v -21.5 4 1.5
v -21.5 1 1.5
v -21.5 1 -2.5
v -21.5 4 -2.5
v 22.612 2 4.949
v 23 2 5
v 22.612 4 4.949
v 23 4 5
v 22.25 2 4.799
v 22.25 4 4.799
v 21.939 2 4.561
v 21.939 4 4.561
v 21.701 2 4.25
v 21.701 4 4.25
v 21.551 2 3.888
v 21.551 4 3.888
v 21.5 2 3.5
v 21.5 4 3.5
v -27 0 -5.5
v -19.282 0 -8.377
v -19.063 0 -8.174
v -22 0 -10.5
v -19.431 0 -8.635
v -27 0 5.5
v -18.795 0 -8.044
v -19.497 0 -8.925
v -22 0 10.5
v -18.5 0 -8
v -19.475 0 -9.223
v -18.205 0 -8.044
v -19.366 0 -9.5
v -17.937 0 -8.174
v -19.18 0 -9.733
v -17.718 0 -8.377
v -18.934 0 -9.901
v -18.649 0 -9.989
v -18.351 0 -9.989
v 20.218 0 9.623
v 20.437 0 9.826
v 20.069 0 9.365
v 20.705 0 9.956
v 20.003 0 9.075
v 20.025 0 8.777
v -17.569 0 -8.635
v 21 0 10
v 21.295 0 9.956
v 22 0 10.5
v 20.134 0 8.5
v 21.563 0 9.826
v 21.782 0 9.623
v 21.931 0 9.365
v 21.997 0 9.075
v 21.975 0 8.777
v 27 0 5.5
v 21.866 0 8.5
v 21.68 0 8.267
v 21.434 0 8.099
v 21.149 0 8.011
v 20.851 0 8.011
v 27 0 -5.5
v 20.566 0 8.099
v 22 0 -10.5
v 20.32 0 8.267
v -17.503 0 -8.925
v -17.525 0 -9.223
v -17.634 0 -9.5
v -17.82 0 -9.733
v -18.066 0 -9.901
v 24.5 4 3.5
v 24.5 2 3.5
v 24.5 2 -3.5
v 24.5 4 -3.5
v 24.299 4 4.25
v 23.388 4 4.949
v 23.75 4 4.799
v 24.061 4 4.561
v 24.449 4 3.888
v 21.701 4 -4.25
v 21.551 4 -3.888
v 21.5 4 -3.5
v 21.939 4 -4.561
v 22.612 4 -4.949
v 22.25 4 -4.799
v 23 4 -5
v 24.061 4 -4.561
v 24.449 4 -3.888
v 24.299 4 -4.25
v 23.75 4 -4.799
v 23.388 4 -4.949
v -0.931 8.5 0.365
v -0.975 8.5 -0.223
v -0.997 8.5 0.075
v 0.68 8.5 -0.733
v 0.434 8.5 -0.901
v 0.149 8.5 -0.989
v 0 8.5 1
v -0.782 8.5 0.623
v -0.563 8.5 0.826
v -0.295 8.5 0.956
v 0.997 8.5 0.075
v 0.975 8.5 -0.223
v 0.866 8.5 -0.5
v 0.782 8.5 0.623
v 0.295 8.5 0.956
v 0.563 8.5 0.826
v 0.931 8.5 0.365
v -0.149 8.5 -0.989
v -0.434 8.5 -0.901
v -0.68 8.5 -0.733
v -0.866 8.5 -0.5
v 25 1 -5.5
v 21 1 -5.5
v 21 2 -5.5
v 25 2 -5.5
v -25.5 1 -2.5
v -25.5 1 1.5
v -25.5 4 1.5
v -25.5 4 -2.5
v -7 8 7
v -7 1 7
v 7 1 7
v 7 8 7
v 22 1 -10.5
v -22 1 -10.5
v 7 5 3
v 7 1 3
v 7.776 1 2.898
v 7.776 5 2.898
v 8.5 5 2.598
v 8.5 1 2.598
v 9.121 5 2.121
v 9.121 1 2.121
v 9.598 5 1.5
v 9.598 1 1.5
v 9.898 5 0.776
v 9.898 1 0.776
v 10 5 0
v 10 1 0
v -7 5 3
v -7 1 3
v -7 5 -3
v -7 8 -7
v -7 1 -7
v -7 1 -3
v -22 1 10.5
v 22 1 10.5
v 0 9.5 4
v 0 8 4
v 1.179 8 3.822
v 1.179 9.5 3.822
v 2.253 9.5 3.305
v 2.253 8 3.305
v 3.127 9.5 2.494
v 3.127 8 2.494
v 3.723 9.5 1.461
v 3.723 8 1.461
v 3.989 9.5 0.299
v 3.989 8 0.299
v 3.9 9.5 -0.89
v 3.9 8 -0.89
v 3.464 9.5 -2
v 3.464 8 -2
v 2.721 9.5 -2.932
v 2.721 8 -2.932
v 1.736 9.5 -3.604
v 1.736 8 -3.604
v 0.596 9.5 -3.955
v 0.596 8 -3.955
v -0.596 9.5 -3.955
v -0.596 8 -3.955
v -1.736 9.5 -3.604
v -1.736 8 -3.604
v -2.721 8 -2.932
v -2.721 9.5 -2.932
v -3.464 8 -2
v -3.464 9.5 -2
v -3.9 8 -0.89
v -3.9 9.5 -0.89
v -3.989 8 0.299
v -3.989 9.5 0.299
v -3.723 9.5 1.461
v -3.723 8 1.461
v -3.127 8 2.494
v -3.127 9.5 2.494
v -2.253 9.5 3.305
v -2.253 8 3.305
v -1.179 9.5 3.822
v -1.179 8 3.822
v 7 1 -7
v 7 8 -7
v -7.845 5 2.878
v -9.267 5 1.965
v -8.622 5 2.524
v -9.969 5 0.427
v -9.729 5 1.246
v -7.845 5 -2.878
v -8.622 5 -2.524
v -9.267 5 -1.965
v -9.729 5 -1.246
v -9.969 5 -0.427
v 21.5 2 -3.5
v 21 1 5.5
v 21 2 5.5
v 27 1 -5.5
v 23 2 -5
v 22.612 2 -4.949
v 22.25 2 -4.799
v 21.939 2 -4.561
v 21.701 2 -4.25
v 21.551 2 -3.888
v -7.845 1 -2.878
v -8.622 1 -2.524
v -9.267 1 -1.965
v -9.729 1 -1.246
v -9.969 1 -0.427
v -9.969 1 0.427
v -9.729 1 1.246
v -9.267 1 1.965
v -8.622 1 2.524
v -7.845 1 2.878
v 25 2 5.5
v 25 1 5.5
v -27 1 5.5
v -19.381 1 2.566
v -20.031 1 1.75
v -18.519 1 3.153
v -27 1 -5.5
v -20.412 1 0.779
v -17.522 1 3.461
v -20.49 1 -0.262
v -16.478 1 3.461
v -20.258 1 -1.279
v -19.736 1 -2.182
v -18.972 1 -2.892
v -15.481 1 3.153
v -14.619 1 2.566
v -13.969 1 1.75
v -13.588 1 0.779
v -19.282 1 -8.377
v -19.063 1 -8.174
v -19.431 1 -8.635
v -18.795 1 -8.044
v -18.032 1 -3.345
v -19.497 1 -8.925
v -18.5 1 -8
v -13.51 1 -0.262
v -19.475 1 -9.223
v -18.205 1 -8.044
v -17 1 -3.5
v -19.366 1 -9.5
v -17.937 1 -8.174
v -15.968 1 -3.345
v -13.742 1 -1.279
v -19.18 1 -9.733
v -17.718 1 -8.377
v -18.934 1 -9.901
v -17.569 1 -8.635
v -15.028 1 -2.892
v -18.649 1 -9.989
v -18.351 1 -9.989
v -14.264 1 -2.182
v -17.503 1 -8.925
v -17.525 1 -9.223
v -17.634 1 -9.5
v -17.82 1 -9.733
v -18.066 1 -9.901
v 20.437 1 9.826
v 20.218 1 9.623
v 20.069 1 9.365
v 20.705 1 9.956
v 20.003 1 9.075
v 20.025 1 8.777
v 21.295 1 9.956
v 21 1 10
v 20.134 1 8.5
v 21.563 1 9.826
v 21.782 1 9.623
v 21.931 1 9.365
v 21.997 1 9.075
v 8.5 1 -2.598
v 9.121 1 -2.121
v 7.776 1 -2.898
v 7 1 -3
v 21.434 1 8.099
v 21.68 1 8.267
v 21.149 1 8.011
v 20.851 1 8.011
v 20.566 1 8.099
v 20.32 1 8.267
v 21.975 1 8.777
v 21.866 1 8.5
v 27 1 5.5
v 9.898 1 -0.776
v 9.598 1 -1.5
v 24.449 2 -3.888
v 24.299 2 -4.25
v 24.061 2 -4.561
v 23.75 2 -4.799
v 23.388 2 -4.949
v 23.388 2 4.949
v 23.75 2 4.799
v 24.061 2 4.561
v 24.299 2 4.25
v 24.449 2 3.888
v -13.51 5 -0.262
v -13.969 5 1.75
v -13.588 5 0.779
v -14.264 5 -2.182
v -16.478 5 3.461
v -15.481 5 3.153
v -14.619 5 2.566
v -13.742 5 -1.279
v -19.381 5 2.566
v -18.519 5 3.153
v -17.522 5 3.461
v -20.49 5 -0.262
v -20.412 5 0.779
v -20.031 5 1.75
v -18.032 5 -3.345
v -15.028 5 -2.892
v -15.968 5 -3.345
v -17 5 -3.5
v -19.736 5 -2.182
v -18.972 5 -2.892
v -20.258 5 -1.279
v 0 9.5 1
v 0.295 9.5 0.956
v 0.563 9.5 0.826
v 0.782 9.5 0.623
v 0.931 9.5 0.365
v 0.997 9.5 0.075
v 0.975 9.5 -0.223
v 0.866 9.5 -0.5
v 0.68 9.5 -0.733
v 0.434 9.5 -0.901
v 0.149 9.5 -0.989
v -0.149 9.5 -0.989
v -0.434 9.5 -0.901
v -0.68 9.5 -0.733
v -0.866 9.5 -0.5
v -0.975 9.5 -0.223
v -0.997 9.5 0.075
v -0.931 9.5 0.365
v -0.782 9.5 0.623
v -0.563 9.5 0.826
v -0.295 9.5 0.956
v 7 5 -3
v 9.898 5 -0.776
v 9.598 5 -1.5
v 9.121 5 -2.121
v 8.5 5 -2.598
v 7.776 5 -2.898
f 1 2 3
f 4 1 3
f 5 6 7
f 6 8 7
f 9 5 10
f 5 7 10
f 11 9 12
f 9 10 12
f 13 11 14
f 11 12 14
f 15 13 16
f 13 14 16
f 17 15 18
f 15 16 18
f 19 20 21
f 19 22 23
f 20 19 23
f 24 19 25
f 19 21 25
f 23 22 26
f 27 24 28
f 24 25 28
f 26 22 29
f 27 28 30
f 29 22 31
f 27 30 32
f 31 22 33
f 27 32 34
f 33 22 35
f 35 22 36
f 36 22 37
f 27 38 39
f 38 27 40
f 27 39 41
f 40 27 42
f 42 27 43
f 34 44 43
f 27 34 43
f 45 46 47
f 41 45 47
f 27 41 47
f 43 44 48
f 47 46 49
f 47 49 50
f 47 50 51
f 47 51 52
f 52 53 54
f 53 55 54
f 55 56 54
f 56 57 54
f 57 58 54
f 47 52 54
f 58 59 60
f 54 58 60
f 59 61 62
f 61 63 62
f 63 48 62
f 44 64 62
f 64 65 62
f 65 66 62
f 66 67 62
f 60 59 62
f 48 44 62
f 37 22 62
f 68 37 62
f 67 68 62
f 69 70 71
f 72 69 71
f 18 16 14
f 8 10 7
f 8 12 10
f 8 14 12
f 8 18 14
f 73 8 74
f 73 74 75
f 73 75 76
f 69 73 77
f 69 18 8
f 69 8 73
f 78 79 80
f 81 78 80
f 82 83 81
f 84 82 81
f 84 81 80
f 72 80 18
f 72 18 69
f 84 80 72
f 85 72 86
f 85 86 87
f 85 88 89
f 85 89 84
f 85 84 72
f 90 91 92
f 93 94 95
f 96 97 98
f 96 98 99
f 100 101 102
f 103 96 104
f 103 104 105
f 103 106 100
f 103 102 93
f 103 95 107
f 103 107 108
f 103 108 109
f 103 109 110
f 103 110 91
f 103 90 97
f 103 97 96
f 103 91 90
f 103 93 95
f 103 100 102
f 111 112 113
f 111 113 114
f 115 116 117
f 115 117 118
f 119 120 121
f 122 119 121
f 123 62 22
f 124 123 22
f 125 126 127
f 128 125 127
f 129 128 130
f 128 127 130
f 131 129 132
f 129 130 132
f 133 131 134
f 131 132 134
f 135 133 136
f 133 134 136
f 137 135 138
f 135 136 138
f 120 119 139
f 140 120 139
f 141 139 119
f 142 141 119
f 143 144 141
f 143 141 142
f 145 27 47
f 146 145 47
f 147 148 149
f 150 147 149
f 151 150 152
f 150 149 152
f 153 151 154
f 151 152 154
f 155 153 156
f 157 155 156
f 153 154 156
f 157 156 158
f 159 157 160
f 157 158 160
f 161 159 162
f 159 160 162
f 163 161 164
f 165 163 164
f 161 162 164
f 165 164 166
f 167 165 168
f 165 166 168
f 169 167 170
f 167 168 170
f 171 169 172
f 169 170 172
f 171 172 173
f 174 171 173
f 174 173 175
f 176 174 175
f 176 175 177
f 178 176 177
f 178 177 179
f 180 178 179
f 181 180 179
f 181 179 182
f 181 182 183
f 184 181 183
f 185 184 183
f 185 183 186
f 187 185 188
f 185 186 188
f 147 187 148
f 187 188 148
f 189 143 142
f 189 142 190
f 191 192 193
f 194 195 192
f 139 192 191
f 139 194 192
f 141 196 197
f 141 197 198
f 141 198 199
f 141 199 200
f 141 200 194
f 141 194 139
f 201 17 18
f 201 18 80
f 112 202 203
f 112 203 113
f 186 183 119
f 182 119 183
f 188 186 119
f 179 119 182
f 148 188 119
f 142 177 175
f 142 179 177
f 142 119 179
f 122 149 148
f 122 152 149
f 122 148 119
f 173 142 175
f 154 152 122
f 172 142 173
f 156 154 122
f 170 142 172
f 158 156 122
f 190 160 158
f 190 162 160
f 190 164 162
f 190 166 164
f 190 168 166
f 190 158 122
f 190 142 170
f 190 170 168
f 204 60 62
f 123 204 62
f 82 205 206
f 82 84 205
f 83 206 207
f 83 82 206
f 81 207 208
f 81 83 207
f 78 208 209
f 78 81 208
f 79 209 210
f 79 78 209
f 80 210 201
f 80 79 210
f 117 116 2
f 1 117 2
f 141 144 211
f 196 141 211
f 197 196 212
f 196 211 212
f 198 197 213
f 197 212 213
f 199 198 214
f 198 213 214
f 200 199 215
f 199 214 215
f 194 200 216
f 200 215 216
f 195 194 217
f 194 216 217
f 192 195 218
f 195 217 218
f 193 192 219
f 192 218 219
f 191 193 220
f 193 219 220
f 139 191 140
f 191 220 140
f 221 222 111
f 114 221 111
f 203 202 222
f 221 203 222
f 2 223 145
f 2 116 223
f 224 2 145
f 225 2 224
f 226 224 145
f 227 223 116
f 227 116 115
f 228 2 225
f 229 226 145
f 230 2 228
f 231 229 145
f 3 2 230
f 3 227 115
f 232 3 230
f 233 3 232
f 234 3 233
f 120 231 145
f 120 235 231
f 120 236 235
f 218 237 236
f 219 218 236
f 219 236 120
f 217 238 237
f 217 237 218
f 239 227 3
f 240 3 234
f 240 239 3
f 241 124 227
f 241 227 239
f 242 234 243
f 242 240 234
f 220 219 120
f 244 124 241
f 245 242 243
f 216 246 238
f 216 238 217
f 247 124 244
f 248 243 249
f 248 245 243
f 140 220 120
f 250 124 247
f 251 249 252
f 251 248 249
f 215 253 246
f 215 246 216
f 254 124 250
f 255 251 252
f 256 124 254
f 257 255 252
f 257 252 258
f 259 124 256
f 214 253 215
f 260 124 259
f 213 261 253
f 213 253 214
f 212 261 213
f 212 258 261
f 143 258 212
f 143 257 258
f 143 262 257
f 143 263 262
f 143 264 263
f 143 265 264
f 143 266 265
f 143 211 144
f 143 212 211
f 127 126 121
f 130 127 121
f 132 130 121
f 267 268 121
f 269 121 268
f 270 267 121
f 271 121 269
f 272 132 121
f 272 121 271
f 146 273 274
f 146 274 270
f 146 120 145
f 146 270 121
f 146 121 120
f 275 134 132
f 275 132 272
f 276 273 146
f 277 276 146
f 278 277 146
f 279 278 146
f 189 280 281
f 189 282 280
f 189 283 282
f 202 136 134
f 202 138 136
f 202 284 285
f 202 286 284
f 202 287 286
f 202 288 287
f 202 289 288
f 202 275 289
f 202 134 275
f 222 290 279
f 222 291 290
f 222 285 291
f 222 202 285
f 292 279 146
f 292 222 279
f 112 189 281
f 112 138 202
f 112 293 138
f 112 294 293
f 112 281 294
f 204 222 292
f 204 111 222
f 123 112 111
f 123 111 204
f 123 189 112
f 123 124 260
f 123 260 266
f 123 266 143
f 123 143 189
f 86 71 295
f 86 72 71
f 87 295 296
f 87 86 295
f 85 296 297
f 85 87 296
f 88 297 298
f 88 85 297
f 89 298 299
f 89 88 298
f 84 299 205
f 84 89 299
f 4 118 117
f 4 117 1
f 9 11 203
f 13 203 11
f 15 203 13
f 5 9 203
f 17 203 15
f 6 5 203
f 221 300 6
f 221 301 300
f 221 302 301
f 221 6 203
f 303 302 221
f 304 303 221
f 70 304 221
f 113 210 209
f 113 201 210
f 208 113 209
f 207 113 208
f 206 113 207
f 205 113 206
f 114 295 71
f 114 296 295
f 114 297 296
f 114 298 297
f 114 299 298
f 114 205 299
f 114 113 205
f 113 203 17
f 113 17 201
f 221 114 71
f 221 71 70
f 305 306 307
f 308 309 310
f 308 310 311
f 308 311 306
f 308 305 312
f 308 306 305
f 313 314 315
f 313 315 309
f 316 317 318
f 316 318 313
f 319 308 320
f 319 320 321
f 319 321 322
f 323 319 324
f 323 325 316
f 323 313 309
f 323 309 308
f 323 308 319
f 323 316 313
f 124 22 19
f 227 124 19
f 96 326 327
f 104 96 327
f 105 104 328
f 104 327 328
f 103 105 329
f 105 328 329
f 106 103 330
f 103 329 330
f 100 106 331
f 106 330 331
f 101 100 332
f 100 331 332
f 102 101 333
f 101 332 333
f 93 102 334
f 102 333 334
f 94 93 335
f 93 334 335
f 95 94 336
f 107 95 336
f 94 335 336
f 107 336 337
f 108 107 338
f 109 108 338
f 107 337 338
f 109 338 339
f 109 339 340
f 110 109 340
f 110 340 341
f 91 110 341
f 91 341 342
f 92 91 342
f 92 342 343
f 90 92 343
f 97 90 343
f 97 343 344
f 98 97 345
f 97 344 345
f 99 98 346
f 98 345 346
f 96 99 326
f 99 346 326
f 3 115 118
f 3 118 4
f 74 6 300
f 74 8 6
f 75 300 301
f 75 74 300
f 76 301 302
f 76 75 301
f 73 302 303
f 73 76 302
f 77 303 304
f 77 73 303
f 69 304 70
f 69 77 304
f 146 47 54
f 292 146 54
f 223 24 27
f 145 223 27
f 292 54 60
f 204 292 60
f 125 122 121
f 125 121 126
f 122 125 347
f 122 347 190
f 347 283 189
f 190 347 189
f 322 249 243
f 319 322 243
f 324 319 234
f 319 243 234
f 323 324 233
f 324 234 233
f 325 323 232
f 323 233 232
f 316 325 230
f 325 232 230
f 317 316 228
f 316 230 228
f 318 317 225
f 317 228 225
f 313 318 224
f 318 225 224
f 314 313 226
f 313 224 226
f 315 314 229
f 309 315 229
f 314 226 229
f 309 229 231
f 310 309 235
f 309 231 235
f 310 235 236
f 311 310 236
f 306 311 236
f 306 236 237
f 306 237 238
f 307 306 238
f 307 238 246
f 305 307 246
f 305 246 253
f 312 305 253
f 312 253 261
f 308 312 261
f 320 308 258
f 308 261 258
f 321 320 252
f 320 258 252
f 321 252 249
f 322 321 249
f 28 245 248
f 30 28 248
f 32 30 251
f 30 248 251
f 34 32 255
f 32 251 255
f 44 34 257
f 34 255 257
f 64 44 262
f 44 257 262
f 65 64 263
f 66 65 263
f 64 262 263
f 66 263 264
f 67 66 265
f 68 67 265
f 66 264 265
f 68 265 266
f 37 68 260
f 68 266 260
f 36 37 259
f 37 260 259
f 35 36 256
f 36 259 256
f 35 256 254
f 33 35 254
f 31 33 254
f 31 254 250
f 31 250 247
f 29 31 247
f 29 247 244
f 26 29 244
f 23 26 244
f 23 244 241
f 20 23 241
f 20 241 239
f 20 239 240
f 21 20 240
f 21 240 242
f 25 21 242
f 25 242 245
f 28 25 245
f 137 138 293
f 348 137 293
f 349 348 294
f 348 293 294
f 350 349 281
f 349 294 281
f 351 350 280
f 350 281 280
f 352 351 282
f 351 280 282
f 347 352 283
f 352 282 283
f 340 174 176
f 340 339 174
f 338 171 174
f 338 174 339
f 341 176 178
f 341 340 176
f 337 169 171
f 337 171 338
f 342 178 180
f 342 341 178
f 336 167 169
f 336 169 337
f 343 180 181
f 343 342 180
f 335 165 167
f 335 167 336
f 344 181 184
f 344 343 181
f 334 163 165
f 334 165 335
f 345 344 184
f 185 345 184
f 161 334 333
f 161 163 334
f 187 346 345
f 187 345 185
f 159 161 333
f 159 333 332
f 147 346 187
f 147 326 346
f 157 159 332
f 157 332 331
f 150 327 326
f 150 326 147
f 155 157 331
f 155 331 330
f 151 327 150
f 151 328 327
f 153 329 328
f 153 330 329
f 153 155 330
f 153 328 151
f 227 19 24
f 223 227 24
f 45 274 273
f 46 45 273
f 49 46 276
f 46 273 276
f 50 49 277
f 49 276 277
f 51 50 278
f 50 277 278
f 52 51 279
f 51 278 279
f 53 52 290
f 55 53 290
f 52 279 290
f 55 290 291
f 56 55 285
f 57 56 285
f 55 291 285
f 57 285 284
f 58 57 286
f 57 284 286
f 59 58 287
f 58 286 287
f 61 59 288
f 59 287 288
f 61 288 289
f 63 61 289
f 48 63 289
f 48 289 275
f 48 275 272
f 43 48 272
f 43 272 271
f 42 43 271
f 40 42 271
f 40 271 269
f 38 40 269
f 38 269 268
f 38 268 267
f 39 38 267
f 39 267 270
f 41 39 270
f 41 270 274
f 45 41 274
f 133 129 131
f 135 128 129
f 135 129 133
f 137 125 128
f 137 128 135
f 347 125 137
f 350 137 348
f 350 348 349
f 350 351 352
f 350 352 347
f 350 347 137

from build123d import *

# Parameters (mm, degrees)
BOSS_EXTRUDE1_DEPTH = 1
SKETCH2_W           = 14
SKETCH2_H           = 14
BOSS_EXTRUDE2_DEPTH = 7
SKETCH3_R           = 4
BOSS_EXTRUDE3_DEPTH = 1.5
BOSS_EXTRUDE4_DEPTH = 4
SKETCH6_R           = 1
CUT_EXTRUDE1_DEPTH  = 1
CUT_EXTRUDE2_REACH  = 32.191
SKETCH7_R           = 1
SKETCH8_R           = 3.5
BOSS_EXTRUDE5_DEPTH = 4
SKETCH9_W           = 4
SKETCH9_H           = 4
BOSS_EXTRUDE6_DEPTH = 3
SKETCH11_W          = 4
SKETCH11_H          = 11
BOSS_EXTRUDE7_DEPTH = 1
SKETCH12_W          = 3
SKETCH12_H          = 10
BOSS_EXTRUDE8_DEPTH = 2
FILLET1_R           = 1.5


with BuildPart() as part:
    # Sketch1 → Boss-Extrude1 (new body)
    with BuildSketch(Plane(origin=(0, 0, 0), x_dir=(1, 0, 0), z_dir=(0, 1, 0))):
        Polygon((-22, -10.5), (22, -10.5), (27, -5.5), (27, 5.5), (22, 10.5), (-22, 10.5), (-27, 5.5), (-27, -5.5), align=None)
    extrude(amount=BOSS_EXTRUDE1_DEPTH)

    # Sketch2 → Boss-Extrude2 (add)
    with BuildSketch(Plane(origin=(0, 1, 0), x_dir=(1, 0, 0), z_dir=(0, 1, 0))):
        Rectangle(SKETCH2_W, SKETCH2_H)
    extrude(amount=BOSS_EXTRUDE2_DEPTH)

    # Sketch3 → Boss-Extrude3 (add)
    with BuildSketch(Plane(origin=(0, 8, 0), x_dir=(1, 0, 0), z_dir=(0, 1, 0))):
        with Locations(Location((0, 0, 0), (0, 0, 270))):
            Circle(SKETCH3_R)
    extrude(amount=BOSS_EXTRUDE3_DEPTH)

    # Sketch4 → Boss-Extrude4 (add)
    with BuildSketch(Plane(origin=(0, 1, 0), x_dir=(1, 0, 0), z_dir=(0, 1, 0))):
        with BuildLine():
            ThreePointArc((7, -3), (9.121320344, -2.121320344), (10, 0))
            ThreePointArc((10, 0), (9.121320344, 2.121320344), (7, 3))
            Line((7, 3), (7, -3))
        make_face()
        with BuildLine():
            Line((7, -3), (7, 3))
            ThreePointArc((7, 3), (4, 0), (7, -3))
        make_face()
        with BuildLine():
            ThreePointArc((-7, -3), (-4.878679656, -2.121320344), (-4, 0))
            ThreePointArc((-4, 0), (-4.878679656, 2.121320344), (-7, 3))
            Line((-7, 3), (-7, -3))
        make_face()
        with BuildLine():
            Line((-7, -3), (-7, 3))
            ThreePointArc((-7, 3), (-10, 0), (-7, -3))
        make_face()
    extrude(amount=BOSS_EXTRUDE4_DEPTH)

    # Sketch6 → Cut-Extrude1 (cut)
    with BuildSketch(Plane(origin=(0, 9.5, 0), x_dir=(1, 0, 0), z_dir=(0, 1, 0))):
        with Locations(Location((0, 0, 0), (0, 0, 270))):
            Circle(SKETCH6_R)
    extrude(amount=-CUT_EXTRUDE1_DEPTH, mode=Mode.SUBTRACT)

    # Sketch7 → Cut-Extrude2 (cut, up to next)
    with BuildSketch(Plane(origin=(0, 1, 0), x_dir=(1, 0, 0), z_dir=(0, 1, 0)), mode=Mode.PRIVATE) as cut_extrude2_sk1:
        with Locations(Location((-18.5, 9, 0), (0, 0, 270))):
            Circle(SKETCH7_R)
    cut_extrude2_tool1 = extrude(cut_extrude2_sk1.sketch, amount=-CUT_EXTRUDE2_REACH, mode=Mode.PRIVATE) & part.part
    # Sketch7 → Cut-Extrude2 (cut, up to next)
    with BuildSketch(Plane(origin=(0, 1, 0), x_dir=(1, 0, 0), z_dir=(0, 1, 0)), mode=Mode.PRIVATE) as cut_extrude2_sk2:
        with Locations(Location((21, -9, 0), (0, 0, 270))):
            Circle(SKETCH7_R)
    cut_extrude2_tool2 = extrude(cut_extrude2_sk2.sketch, amount=-CUT_EXTRUDE2_REACH, mode=Mode.PRIVATE) & part.part
    add(cut_extrude2_tool1.solids().sort_by_distance((-18.5, 1, -9))[0], mode=Mode.SUBTRACT)
    add(cut_extrude2_tool2.solids().sort_by_distance((21, 1, 9))[0], mode=Mode.SUBTRACT)

    # Sketch8 → Boss-Extrude5 (add)
    with BuildSketch(Plane(origin=(0, 1, 0), x_dir=(1, 0, 0), z_dir=(0, 1, 0))):
        with Locations(Location((-17, 0, 0), (0, 0, 90))):
            Circle(SKETCH8_R)
    extrude(amount=BOSS_EXTRUDE5_DEPTH)

    # Sketch9 → Boss-Extrude6 (add)
    with BuildSketch(Plane(origin=(0, 1, 0), x_dir=(1, 0, 0), z_dir=(0, 1, 0))):
        with Locations((-23.5, 0.5)):
            Rectangle(SKETCH9_W, SKETCH9_H)
    extrude(amount=BOSS_EXTRUDE6_DEPTH)

    # Sketch11 → Boss-Extrude7 (add)
    with BuildSketch(Plane(origin=(0, 1, 0), x_dir=(1, 0, 0), z_dir=(0, 1, 0))):
        with Locations((23, 0)):
            Rectangle(SKETCH11_W, SKETCH11_H)
    extrude(amount=BOSS_EXTRUDE7_DEPTH)

    # Sketch12 → Boss-Extrude8 (add)
    with BuildSketch(Plane(origin=(0, 2, 0), x_dir=(1, 0, 0), z_dir=(0, 1, 0))):
        with Locations((23, 0)):
            Rectangle(SKETCH12_W, SKETCH12_H)
    extrude(amount=BOSS_EXTRUDE8_DEPTH)

    # Fillet1
    fillet1_edges = [part.edges().sort_by_distance(p)[0] for p in [
        (24.5, 3, -5),
        (21.5, 3, -5),
        (21.5, 3, 5),
        (24.5, 3, 5),
    ]]
    fillet(fillet1_edges, radius=FILLET1_R - 0.0001)  # a hair under: the kernel refuses the full size


solid = part.part
